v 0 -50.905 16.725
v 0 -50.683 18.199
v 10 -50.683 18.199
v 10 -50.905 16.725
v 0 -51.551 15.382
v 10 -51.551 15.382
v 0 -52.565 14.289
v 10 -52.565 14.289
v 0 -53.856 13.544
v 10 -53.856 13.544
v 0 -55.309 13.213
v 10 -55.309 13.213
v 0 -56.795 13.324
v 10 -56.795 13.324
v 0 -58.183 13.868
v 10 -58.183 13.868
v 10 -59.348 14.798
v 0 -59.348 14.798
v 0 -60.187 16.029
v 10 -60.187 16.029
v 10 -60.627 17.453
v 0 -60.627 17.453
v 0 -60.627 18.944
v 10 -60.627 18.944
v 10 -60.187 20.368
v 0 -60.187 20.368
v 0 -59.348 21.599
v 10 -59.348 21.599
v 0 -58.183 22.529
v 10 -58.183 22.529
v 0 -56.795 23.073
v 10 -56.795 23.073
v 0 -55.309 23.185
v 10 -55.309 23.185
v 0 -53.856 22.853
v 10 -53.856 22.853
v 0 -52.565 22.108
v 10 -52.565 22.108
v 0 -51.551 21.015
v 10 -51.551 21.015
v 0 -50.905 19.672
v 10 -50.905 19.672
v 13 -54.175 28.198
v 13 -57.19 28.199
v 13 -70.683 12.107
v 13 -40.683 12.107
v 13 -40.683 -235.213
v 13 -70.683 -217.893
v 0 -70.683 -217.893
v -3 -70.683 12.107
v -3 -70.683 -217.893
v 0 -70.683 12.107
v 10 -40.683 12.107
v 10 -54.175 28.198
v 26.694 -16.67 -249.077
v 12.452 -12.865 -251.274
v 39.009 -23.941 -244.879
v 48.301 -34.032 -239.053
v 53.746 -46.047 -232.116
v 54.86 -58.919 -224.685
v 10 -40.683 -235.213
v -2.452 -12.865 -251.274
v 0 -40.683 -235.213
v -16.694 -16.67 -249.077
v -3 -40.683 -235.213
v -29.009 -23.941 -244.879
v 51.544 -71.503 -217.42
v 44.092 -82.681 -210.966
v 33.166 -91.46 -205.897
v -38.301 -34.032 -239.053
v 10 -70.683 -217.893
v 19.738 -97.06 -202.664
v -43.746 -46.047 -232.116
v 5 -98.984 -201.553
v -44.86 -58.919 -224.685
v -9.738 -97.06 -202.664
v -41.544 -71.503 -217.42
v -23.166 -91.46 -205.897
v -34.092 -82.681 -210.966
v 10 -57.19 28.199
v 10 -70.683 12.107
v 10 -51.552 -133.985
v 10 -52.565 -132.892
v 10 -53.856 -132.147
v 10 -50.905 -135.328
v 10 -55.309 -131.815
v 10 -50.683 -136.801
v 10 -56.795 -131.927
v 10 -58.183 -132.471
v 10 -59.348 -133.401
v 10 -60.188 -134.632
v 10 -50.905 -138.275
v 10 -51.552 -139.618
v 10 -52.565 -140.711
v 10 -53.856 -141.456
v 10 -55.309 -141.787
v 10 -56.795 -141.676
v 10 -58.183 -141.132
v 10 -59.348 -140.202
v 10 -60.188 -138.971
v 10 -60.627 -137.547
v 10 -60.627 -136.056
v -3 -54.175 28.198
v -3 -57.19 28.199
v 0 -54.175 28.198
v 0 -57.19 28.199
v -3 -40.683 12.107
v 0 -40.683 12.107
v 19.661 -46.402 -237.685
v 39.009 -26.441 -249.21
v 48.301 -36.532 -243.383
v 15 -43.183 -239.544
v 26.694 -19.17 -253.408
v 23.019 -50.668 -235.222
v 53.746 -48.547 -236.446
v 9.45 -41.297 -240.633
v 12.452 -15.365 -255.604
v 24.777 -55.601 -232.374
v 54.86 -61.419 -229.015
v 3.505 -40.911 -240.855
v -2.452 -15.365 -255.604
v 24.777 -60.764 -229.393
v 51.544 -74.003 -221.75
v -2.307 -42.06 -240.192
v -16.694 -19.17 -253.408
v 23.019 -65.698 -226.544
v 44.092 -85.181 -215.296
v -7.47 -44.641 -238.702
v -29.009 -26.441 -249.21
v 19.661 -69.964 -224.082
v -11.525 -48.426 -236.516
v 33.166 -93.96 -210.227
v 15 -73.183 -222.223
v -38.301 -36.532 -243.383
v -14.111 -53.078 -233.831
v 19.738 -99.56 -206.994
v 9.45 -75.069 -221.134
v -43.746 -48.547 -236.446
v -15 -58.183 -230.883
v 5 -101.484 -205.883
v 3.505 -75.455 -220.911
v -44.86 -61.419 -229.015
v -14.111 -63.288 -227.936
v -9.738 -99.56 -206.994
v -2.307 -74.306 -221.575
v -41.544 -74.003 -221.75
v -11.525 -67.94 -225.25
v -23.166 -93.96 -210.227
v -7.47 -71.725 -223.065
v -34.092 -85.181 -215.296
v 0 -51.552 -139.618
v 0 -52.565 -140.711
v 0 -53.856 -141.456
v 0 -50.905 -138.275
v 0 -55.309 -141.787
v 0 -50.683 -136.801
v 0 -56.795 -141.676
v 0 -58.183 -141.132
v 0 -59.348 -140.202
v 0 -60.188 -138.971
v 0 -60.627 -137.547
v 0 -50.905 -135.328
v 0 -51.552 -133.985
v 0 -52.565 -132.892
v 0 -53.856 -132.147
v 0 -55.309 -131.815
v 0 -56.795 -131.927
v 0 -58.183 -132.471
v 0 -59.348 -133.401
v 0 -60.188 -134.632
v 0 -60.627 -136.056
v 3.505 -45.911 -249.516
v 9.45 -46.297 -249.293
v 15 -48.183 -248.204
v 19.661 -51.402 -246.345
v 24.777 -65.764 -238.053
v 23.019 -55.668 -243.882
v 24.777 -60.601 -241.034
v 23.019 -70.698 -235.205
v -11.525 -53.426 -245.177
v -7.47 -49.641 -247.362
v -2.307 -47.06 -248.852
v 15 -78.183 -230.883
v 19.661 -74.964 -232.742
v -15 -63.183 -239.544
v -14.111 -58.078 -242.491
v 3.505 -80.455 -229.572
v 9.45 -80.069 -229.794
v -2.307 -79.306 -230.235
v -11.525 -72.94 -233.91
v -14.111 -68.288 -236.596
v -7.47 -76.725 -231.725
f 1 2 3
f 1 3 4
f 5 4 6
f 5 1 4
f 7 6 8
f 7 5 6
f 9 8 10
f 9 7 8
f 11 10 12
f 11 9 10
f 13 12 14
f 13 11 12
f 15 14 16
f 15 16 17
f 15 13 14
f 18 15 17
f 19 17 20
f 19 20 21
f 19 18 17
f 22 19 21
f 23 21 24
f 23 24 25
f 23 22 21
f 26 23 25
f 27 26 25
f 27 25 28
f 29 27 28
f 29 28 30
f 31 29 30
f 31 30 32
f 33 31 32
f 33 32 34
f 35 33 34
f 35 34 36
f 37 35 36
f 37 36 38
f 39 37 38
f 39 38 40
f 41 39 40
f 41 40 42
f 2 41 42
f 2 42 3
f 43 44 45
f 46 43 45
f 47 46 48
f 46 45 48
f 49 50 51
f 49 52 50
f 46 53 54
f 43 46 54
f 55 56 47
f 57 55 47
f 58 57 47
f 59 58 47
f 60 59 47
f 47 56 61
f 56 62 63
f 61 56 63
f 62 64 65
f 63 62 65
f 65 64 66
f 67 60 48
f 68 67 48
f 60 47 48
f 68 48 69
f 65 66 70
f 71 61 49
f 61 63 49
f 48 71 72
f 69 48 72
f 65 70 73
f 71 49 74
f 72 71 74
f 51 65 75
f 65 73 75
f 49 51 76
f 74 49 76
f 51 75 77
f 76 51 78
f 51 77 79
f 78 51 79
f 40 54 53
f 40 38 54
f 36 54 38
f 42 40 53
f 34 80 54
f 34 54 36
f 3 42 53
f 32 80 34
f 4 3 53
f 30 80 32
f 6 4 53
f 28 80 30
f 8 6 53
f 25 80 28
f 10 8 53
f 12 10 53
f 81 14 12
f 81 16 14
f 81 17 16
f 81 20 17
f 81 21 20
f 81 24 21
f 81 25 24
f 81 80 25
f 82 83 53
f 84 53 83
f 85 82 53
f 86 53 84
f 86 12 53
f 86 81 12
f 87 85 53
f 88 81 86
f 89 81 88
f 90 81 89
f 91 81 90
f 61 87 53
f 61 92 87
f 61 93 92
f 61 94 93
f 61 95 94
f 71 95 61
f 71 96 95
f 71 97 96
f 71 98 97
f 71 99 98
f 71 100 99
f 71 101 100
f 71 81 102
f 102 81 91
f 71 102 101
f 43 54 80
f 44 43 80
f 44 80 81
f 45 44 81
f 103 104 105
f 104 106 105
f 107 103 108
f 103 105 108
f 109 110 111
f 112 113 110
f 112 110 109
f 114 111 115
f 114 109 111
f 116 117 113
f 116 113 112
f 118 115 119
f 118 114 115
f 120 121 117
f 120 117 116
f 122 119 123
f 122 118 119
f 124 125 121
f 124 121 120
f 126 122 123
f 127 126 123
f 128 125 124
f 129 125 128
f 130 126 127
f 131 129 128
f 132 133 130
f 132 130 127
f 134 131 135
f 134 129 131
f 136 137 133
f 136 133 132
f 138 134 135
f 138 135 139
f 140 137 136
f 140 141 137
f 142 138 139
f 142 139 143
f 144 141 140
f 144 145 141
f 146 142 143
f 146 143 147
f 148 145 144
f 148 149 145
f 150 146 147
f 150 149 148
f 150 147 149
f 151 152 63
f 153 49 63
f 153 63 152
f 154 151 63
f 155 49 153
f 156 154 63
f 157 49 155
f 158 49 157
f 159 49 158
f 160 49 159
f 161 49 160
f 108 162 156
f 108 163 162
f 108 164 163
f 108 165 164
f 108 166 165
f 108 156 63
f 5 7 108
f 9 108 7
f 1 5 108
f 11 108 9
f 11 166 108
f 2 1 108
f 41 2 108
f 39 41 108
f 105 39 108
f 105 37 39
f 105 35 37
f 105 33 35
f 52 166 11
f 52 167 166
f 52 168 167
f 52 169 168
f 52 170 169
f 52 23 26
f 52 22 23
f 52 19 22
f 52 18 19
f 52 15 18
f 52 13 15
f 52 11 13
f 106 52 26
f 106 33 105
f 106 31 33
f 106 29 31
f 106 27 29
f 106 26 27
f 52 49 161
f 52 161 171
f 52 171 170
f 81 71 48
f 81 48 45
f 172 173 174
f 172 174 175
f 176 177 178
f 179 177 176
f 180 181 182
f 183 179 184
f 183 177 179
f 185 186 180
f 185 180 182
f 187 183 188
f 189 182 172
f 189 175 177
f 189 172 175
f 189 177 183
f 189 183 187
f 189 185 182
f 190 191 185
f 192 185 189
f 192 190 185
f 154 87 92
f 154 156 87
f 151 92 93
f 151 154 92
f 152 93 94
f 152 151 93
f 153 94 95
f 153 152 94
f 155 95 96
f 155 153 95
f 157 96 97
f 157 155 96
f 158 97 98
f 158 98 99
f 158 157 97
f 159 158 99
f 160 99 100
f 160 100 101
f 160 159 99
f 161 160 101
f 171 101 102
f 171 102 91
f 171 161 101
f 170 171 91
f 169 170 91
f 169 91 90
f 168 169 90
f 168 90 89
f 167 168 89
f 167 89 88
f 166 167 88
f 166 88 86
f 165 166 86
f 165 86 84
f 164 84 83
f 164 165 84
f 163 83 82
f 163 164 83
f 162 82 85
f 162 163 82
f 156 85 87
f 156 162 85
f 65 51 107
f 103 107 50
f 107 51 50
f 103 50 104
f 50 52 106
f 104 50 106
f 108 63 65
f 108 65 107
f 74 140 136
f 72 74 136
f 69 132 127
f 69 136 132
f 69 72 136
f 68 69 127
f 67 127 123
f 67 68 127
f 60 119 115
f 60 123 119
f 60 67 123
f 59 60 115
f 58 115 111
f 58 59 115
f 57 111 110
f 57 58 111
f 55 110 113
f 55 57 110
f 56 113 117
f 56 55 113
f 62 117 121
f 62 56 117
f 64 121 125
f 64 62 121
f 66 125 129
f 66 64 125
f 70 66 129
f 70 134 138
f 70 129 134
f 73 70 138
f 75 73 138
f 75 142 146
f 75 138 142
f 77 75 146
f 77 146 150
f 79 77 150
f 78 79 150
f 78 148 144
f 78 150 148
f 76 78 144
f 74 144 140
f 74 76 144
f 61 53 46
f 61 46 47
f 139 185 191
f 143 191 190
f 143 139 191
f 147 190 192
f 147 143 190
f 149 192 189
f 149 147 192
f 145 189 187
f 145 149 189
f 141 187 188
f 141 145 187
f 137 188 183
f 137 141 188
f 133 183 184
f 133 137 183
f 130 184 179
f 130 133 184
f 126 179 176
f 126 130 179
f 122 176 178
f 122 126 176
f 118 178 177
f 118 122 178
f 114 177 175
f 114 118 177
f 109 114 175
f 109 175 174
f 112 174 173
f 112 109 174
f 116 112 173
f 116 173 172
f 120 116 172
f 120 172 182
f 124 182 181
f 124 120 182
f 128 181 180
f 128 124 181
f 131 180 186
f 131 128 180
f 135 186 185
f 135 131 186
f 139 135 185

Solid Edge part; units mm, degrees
sketch "Sketch1" plane through (0, 0, 0) normal (1, 0, 0) x (0, 1, 0)
  line L0 (-40.6829, -217.8929) -> (-40.6829, 12.1071)
  line L1 (-40.6829, 12.1071) -> (-70.6829, 12.1071)
  line L2 (-70.6829, 12.1071) -> (-70.6829, -217.8929)
  line L3 (-70.6829, -217.8929) -> (-40.6829, -235.2134)
  line L4 (-40.6829, -235.2134) -> (-40.6829, -217.8929)
  line L5 (-70.6829, 12.1071) -> (-40.6829, 12.1071)
  line L6 (-54.1753, 28.1984) -> (-40.6829, 12.1071)
  line L7 (-57.1901, 28.1988) -> (-54.1753, 28.1984)
  line L8 (-70.6829, 12.1071) -> (-57.1901, 28.1988)
  dimension "D1" = 30
  dimension "D2" = 20.9994
  dimension "D3" = 21
  dimension "D4" = 230
  dimension "D5" = 30
extrude "Protrusion1" add sketch "Sketch1" against normal blind 3
sketch "Sketch2" plane through (0, -21.8205, 20.1807) normal (1, 0, 0) x (0, 1, 0)
  circle A0 centre (-33.8622, -156.9821) radius 5
  circle A1 centre (-33.8621, -1.9821) radius 5
  dimension "D1" = 9.9998
  dimension "D2" = 155
extrude "ExtrudedProtrusion_2" add sketch "Sketch2" along normal blind 11
mirror "Mirror1" about plane through (5, -21.8205, 20.1506) normal (1, 0, 0) of "Protrusion1"
sketch "Sketch3" plane through (-1.5, -55.6829, -226.5532) normal (0, -0.5, -0.866) x (0, -0.866, 0.5)
  circle A0 centre (0, -6.5) radius 50
  dimension "D1" = 5
extrude "ExtrudedProtrusion_5" add sketch "Sketch3" along normal blind 5
sketch "Sketch4" plane through (5, -58.1829, -230.8833) normal (0, -0.5, -0.866) x (-1, 0, 0)
  circle A0 centre (0, 0) radius 20
extrude "ExtrudedProtrusion_6" add sketch "Sketch4" along normal blind 10
